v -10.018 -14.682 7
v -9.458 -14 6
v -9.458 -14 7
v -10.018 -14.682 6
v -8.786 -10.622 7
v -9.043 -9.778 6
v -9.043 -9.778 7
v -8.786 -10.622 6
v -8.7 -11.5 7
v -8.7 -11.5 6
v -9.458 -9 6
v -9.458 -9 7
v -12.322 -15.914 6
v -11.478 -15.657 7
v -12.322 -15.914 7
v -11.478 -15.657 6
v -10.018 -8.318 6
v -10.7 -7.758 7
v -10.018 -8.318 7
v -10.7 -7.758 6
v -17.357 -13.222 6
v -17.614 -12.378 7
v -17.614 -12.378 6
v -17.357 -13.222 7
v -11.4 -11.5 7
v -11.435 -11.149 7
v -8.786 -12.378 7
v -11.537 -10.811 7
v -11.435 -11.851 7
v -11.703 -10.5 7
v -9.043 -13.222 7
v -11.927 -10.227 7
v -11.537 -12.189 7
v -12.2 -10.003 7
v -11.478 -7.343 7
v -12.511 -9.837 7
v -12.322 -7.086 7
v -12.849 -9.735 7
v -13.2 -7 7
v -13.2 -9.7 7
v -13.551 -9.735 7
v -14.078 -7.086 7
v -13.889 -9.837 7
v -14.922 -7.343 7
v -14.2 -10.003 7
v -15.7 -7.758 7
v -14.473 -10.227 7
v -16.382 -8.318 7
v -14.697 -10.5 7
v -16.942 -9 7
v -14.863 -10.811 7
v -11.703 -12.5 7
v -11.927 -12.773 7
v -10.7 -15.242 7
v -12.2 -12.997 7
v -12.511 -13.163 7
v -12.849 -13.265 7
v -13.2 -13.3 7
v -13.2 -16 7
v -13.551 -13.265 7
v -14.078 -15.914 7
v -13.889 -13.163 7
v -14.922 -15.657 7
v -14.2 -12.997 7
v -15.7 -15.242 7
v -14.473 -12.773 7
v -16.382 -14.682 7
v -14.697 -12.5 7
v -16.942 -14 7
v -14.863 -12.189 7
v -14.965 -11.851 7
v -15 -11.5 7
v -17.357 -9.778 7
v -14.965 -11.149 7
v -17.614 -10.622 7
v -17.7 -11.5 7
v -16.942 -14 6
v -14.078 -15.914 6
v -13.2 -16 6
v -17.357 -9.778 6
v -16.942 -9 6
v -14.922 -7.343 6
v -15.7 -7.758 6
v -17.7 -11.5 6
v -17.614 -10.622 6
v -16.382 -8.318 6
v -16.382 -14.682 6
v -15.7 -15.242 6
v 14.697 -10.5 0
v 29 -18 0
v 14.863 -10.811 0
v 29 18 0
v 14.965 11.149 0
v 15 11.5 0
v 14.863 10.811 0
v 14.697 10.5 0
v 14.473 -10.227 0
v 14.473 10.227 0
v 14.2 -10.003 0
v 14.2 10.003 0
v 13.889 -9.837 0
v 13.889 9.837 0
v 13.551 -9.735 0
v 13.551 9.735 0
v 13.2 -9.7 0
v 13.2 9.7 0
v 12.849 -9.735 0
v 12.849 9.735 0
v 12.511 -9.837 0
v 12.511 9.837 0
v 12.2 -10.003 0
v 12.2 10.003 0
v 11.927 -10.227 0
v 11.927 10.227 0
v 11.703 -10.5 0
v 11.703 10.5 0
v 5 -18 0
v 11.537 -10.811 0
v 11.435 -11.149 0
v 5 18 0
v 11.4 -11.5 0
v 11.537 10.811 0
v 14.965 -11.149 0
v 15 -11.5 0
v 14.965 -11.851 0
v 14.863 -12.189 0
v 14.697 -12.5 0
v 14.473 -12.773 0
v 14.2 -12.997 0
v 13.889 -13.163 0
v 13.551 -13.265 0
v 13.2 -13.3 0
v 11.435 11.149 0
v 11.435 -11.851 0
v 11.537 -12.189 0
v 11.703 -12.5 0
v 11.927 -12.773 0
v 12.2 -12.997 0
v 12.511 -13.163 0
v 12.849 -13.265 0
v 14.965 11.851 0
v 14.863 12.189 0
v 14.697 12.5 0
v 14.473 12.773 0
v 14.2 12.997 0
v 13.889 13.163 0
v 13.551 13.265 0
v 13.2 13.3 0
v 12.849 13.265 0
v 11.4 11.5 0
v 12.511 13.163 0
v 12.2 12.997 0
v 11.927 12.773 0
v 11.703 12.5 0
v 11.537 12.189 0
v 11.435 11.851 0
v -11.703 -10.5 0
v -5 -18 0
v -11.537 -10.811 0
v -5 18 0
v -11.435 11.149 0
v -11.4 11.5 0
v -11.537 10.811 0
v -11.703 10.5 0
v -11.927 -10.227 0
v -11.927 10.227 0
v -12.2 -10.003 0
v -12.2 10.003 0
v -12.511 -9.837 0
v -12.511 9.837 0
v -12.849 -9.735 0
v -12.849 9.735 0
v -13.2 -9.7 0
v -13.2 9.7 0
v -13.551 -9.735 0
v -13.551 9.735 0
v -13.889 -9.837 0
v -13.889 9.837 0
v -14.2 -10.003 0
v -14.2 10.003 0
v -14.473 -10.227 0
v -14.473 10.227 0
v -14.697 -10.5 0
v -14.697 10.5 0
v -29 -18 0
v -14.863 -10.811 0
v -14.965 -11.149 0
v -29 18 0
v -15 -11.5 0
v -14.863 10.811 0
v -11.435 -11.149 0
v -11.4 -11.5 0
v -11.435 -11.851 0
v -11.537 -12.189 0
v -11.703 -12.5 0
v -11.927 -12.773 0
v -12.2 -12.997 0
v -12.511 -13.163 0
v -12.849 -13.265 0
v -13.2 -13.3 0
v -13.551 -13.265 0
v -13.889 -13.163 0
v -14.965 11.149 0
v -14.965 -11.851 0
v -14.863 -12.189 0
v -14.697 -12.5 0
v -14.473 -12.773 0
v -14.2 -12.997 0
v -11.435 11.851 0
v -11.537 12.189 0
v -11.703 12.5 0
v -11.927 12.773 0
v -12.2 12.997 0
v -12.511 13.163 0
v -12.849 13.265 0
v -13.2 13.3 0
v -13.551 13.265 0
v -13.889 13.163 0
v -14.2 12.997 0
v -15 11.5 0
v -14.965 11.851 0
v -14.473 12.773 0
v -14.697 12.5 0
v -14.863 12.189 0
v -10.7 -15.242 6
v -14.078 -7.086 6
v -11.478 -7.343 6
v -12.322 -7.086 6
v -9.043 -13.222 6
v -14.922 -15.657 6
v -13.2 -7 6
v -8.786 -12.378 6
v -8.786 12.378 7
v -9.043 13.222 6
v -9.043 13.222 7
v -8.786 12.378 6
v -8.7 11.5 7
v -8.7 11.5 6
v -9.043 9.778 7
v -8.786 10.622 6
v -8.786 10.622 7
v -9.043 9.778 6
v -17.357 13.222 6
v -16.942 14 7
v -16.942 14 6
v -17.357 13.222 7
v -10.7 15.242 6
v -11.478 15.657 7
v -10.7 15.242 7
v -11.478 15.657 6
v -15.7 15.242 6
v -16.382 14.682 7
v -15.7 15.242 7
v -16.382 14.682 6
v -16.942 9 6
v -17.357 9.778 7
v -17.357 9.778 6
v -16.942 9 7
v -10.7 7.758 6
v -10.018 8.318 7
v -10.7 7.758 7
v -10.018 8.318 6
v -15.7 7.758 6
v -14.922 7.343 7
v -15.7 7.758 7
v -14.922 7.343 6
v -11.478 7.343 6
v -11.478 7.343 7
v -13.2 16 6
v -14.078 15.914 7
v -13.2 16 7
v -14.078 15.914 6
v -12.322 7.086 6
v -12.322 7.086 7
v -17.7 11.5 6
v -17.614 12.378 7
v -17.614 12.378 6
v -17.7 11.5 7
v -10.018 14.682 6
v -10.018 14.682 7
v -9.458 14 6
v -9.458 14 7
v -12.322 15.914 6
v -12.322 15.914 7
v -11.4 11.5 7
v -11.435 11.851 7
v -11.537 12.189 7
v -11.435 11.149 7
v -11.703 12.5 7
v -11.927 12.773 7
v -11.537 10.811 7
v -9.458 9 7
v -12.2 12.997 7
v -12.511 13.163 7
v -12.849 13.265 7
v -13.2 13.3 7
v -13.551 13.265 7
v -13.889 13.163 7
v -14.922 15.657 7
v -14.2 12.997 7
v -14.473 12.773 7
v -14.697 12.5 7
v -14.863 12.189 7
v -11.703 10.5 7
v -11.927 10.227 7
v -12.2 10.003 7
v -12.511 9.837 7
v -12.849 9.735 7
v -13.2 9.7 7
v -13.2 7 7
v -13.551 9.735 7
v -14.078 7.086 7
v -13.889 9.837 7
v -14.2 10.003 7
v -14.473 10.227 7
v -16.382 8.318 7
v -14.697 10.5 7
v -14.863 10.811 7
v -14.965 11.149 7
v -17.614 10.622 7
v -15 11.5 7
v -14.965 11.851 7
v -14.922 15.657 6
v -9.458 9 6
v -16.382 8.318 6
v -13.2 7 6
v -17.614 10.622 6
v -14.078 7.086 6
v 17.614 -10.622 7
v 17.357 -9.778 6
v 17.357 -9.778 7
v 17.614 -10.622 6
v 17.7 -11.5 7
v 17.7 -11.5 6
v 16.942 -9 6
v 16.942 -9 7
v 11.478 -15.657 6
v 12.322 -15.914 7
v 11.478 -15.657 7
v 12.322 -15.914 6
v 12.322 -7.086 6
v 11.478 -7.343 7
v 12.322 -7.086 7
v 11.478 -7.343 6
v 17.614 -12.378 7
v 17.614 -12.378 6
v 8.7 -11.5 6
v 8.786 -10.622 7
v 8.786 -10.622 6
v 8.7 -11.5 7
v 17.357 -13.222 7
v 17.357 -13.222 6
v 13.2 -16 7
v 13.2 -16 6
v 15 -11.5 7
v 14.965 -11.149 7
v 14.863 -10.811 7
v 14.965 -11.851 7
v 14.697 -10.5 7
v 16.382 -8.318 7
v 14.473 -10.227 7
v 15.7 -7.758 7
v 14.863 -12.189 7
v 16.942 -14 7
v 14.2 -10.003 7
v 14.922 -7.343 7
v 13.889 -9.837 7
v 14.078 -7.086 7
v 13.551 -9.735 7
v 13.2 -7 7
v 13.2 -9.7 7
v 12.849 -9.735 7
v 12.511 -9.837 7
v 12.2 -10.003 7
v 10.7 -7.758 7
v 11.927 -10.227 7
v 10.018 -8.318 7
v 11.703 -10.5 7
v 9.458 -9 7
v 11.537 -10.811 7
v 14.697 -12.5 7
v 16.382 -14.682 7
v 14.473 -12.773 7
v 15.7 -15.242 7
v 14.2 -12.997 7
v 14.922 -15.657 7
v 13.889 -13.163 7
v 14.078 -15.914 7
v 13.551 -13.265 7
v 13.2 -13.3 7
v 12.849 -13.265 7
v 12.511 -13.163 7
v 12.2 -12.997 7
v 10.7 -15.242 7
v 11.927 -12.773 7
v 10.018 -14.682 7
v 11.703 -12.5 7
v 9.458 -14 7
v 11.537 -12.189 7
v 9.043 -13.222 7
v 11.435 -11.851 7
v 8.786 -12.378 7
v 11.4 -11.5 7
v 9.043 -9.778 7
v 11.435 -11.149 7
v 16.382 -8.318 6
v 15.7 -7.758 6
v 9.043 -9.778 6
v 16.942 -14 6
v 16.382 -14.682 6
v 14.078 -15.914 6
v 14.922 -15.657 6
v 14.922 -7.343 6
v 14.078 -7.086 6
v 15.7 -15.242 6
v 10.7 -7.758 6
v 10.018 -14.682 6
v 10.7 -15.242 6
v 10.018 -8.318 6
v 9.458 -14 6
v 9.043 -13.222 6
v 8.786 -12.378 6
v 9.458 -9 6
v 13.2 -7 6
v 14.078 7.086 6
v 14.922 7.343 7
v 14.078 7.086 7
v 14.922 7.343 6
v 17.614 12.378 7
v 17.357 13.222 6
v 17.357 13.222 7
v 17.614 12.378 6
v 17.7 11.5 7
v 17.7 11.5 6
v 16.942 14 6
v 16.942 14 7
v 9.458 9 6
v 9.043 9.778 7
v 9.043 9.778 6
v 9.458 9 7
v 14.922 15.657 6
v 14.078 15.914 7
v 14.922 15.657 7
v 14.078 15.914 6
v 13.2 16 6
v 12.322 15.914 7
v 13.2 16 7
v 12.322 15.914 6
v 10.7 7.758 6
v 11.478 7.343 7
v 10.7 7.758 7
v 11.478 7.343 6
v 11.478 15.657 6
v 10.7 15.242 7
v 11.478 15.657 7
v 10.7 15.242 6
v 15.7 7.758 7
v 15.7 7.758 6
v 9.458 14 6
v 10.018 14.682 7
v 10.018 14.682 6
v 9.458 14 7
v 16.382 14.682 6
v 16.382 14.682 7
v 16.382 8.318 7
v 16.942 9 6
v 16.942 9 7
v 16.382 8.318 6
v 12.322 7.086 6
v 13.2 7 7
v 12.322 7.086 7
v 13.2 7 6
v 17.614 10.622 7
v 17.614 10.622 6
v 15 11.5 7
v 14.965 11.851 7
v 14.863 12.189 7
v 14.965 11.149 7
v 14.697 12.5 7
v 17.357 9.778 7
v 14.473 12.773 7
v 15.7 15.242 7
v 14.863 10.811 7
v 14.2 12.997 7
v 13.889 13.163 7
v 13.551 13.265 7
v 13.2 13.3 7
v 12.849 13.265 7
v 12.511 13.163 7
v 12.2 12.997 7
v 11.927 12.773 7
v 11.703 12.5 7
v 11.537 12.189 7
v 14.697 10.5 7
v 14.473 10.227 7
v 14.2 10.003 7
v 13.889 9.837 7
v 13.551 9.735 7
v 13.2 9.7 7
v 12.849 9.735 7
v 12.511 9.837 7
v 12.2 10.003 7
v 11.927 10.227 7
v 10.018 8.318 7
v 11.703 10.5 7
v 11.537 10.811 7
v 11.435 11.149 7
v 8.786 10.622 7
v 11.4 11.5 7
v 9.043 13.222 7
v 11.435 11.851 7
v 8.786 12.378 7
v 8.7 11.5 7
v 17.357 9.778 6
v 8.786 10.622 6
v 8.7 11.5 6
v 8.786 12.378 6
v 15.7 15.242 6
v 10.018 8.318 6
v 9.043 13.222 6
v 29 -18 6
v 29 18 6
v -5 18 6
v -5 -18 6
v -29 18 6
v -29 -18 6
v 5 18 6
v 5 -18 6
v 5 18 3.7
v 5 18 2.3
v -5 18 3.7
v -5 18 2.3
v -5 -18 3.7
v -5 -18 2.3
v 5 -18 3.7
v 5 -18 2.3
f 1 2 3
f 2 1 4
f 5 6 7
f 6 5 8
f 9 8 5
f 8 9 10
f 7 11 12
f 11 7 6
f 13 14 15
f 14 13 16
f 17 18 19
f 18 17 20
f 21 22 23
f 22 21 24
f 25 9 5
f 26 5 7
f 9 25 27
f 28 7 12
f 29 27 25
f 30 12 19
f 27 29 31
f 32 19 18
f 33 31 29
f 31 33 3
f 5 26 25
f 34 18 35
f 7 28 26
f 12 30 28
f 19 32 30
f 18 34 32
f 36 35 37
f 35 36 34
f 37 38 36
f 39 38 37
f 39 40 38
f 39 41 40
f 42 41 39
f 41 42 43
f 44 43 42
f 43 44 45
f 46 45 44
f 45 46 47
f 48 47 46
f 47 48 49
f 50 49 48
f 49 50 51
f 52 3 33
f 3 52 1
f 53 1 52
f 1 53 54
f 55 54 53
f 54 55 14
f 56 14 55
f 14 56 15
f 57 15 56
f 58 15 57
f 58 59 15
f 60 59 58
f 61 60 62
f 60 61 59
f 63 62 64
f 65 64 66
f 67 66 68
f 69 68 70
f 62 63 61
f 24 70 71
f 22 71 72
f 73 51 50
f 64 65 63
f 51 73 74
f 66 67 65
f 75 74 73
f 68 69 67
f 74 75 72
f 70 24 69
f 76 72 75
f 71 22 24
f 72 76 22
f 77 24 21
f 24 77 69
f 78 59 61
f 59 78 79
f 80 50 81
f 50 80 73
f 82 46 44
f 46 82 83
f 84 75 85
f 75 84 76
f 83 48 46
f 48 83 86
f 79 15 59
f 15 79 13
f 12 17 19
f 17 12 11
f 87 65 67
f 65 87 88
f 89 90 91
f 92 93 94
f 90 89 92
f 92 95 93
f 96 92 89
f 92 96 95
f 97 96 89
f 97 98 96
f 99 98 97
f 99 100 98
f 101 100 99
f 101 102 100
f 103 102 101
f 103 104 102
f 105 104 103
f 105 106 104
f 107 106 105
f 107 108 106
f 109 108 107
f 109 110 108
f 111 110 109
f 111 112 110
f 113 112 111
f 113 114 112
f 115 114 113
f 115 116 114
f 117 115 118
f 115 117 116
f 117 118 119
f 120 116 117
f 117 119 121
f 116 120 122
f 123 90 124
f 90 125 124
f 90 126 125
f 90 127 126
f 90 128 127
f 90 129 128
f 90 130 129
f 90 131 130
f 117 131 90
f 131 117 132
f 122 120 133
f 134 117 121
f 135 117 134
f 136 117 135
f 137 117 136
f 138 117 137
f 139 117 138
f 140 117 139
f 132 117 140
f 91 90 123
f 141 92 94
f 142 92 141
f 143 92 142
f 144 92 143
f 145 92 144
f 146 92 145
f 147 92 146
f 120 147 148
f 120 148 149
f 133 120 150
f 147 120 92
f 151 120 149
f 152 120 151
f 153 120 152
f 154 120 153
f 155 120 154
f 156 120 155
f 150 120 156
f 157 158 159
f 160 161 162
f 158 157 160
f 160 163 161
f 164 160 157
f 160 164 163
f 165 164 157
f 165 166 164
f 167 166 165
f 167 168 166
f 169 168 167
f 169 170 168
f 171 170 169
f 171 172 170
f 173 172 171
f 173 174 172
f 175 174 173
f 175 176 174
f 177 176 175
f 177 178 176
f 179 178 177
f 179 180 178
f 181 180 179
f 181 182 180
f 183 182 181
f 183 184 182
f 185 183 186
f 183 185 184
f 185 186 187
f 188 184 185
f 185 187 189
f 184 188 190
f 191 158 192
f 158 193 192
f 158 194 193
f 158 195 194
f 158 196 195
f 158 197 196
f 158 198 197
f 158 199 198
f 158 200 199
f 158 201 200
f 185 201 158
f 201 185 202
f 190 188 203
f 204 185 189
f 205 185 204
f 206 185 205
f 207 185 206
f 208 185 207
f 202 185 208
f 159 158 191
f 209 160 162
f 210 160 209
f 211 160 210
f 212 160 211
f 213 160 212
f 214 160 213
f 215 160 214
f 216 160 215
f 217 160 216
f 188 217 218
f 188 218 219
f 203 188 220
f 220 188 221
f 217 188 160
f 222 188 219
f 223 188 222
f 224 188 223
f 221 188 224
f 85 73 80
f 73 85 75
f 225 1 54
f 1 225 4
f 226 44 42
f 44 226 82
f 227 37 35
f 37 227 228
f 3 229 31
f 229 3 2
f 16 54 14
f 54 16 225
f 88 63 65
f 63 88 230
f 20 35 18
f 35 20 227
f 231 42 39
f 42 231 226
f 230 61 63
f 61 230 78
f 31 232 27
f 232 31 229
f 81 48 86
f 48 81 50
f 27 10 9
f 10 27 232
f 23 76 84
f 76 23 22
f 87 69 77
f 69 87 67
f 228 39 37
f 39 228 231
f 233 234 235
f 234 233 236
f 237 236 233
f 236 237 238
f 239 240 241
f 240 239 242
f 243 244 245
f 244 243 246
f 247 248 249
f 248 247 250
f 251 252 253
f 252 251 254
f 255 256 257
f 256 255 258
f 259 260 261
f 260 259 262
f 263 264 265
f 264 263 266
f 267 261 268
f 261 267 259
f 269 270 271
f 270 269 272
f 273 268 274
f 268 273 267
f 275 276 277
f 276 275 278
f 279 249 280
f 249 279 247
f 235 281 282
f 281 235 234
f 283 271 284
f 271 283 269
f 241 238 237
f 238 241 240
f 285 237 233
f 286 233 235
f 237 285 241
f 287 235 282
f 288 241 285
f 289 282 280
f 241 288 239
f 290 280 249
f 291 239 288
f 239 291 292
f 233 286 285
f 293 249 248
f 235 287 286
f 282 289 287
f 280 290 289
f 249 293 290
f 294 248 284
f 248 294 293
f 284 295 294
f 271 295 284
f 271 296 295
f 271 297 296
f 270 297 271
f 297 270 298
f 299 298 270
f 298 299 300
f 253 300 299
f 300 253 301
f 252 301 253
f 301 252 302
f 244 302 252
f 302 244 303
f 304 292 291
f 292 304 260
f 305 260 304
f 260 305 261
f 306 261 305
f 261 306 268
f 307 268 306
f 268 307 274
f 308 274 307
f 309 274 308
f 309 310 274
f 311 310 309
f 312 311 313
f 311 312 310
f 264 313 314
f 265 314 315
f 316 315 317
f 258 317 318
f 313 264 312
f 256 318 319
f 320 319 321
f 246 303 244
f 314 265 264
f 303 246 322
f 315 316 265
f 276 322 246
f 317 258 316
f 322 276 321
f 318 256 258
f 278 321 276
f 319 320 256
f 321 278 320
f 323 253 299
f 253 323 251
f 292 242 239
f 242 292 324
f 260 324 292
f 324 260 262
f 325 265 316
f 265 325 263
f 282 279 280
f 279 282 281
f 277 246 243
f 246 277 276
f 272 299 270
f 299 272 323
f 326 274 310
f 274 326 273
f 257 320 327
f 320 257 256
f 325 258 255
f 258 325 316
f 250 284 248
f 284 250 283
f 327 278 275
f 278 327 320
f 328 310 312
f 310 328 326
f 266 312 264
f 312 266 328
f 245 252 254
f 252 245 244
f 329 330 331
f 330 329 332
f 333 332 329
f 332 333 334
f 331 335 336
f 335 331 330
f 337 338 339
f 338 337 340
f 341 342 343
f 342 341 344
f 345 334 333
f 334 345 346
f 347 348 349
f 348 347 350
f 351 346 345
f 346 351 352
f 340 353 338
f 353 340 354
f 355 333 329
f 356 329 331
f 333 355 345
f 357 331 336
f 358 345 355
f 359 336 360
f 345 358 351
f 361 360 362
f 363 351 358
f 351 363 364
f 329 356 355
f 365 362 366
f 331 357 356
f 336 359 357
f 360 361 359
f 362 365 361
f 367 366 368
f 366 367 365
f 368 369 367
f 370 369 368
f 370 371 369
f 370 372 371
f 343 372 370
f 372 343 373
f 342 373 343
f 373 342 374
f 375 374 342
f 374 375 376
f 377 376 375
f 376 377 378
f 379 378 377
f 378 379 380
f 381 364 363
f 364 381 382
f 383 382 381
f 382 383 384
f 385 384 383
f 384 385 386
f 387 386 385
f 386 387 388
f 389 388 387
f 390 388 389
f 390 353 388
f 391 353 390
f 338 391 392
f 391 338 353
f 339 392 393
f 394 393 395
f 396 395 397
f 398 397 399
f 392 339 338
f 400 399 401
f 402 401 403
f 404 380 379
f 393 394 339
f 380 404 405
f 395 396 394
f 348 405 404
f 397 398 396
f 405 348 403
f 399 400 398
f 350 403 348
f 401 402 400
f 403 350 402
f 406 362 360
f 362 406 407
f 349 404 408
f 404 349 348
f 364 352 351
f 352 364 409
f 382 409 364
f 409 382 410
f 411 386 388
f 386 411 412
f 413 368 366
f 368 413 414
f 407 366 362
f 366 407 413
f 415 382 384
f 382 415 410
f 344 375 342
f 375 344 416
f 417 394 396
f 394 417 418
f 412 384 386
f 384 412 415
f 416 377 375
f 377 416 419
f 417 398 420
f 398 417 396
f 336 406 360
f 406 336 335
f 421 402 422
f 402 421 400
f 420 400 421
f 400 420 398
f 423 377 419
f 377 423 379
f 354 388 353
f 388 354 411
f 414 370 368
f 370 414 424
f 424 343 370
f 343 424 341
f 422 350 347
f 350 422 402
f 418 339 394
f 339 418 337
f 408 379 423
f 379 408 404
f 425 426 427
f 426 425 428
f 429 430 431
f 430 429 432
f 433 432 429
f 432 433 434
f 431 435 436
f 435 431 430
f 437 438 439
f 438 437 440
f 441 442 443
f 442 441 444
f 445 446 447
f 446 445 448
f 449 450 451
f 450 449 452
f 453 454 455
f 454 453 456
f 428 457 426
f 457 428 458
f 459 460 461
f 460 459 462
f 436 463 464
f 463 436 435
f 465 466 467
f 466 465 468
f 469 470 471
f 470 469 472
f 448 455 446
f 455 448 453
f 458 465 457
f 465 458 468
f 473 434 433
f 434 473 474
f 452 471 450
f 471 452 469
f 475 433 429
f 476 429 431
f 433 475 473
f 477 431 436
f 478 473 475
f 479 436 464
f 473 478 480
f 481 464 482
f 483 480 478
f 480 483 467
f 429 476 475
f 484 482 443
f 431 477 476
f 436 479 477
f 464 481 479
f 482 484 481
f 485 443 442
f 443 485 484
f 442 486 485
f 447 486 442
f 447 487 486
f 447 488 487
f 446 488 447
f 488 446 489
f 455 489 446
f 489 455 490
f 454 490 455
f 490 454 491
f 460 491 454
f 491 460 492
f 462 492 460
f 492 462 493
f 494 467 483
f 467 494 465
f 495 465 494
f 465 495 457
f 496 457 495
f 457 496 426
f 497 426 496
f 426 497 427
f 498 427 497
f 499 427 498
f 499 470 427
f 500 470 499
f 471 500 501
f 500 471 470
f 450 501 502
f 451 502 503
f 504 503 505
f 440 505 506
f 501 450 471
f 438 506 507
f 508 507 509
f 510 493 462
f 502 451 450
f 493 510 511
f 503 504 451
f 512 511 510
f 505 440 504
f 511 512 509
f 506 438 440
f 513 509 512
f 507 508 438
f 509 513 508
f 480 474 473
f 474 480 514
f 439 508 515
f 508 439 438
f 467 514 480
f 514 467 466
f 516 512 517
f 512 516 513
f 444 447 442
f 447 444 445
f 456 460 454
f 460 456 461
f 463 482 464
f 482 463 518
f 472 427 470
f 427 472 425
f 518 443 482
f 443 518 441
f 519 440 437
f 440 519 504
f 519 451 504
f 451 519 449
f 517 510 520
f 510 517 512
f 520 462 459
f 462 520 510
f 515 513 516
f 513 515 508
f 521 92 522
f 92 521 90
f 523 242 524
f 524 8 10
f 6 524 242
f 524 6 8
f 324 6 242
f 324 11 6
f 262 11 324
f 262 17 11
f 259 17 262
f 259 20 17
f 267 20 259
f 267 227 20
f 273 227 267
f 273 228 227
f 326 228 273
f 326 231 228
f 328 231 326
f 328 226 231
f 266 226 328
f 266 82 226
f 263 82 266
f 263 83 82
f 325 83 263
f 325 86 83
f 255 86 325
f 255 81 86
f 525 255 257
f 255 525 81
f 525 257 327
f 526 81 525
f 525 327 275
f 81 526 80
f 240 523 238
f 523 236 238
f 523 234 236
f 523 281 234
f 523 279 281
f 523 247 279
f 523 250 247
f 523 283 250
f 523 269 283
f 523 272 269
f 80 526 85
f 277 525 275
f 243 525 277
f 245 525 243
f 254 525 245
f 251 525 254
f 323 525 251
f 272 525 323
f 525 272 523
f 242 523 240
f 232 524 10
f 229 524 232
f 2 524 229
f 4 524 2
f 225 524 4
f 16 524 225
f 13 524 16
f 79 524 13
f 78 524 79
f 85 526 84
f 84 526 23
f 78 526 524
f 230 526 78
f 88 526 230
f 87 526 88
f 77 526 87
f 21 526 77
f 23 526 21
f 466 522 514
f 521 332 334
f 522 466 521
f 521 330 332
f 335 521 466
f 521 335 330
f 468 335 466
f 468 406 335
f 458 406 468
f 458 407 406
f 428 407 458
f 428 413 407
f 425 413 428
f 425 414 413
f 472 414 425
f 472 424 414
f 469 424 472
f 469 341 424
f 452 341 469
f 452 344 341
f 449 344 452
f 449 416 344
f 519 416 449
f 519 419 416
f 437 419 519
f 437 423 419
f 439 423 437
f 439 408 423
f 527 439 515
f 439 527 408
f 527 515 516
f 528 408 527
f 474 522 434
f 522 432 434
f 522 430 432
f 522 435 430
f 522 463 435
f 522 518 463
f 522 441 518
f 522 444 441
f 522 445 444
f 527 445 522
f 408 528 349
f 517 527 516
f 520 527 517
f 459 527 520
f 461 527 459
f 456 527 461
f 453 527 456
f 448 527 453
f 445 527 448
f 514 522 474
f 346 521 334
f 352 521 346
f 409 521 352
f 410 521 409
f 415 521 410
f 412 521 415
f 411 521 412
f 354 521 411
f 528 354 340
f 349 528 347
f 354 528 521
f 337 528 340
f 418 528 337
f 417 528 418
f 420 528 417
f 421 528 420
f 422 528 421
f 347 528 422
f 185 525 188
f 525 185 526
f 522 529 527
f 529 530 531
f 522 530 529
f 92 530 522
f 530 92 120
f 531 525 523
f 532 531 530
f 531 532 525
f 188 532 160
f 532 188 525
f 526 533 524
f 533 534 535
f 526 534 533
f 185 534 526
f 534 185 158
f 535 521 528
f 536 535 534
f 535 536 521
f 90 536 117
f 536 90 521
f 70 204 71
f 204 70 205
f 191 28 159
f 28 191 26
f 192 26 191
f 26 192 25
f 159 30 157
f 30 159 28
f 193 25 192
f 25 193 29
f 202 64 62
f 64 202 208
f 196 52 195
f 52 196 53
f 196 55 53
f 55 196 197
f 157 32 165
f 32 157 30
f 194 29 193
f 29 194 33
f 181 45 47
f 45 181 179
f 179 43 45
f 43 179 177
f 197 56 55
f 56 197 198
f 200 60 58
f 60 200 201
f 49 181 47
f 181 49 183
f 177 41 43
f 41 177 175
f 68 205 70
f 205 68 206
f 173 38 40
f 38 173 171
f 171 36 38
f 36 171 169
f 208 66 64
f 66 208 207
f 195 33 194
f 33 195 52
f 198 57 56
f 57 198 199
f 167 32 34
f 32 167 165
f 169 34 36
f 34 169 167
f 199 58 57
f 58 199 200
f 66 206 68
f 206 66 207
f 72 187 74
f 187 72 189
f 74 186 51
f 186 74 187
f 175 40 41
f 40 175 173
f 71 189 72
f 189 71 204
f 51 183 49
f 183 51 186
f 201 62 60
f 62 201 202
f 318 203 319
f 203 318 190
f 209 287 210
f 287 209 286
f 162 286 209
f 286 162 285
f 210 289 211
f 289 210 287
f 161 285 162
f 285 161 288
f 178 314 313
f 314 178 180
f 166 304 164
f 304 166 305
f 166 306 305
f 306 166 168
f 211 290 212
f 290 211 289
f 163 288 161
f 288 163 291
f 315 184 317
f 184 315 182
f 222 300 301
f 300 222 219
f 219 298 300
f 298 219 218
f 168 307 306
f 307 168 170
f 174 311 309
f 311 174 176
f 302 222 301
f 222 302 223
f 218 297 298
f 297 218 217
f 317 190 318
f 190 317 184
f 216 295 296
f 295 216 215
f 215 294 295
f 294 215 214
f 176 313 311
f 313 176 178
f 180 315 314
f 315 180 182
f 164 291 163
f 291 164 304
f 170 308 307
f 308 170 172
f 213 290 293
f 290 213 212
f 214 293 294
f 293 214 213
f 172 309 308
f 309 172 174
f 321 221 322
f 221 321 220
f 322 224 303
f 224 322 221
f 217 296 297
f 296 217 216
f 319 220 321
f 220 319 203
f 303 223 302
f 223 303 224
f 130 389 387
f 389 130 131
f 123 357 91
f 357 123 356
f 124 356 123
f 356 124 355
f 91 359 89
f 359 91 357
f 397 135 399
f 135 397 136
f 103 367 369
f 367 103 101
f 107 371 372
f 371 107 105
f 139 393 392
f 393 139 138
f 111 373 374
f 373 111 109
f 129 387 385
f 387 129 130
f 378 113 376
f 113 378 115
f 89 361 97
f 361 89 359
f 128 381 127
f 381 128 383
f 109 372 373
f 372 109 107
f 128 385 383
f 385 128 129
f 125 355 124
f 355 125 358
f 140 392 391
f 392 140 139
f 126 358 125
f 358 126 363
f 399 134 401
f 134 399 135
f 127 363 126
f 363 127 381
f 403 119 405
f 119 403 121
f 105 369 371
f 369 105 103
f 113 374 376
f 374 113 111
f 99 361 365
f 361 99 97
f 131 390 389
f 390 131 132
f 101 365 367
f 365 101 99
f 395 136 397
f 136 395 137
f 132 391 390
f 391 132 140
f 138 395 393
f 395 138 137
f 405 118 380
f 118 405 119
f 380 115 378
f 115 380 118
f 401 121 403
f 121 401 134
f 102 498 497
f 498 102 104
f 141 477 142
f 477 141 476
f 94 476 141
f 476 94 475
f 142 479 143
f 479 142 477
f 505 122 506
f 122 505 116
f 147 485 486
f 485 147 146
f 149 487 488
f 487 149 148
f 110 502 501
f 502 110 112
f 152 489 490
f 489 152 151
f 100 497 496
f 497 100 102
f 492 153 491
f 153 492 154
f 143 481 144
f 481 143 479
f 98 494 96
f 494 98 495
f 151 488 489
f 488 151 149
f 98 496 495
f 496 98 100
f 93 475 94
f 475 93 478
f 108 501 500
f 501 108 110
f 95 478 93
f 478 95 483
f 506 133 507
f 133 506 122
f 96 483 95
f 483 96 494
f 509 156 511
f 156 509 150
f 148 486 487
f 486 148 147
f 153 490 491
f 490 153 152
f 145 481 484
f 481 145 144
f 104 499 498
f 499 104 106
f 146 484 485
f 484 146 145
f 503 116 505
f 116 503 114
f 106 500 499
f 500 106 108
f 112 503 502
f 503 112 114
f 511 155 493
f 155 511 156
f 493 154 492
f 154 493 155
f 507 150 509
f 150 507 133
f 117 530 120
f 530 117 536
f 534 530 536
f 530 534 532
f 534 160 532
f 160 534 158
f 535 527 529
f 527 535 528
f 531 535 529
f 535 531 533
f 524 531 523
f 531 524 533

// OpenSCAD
$fn = 32;

// ----------------------------------------------------------------------
// Living hinge: 58 x 36 mm plates, 1.4 mm flexible web
// ----------------------------------------------------------------------

// --- parameters (mm) ---
plate_len = 24;           // plate length outside the web
plate_w = 36;             // plate width
thick = 6;                // plate thickness
web_half = 5;             // half width of the flex band
web_t = 1.4;              // flexible web thickness
web_z = 2.3;              // web position inside the thickness
boss_d = 9;               // screw boss diameter
boss_h = 7;               // screw boss height
boss_x = 13.2;            // screw boss distance from the web
screw_d = 3.6;            // screw hole

difference() {
  union() {
    /* one flat strip, later thinned at the middle */
    translate([-29, -18, 0]) cube([58, 36, 6]);
    /* screw bosses, sunk 0.5 mm into the plates */
    for (sx = [-13.2, 13.2]) {
      for (sy = [-11.5, 11.5]) {
        translate([sx, sy, 0]) cylinder(h = boss_h, d = boss_d);
      }
    }
  }
  /* channel from below: leaves the web on top of it */
  translate([-5, -20.5, -2.5]) cube([10, 41, 4.8]);
  /* channel from above: thins the web down to web_t */
  translate([-5, -20.5, 3.7]) cube([10, 41, 4.8]);
  /* screw holes through the bosses */
  for (sx = [-13.2, 13.2]) {
    for (sy = [-11.5, 11.5]) {
      translate([sx, sy, -2.5]) cylinder(h = boss_h + 5, d = screw_d);
    }
  }
}
